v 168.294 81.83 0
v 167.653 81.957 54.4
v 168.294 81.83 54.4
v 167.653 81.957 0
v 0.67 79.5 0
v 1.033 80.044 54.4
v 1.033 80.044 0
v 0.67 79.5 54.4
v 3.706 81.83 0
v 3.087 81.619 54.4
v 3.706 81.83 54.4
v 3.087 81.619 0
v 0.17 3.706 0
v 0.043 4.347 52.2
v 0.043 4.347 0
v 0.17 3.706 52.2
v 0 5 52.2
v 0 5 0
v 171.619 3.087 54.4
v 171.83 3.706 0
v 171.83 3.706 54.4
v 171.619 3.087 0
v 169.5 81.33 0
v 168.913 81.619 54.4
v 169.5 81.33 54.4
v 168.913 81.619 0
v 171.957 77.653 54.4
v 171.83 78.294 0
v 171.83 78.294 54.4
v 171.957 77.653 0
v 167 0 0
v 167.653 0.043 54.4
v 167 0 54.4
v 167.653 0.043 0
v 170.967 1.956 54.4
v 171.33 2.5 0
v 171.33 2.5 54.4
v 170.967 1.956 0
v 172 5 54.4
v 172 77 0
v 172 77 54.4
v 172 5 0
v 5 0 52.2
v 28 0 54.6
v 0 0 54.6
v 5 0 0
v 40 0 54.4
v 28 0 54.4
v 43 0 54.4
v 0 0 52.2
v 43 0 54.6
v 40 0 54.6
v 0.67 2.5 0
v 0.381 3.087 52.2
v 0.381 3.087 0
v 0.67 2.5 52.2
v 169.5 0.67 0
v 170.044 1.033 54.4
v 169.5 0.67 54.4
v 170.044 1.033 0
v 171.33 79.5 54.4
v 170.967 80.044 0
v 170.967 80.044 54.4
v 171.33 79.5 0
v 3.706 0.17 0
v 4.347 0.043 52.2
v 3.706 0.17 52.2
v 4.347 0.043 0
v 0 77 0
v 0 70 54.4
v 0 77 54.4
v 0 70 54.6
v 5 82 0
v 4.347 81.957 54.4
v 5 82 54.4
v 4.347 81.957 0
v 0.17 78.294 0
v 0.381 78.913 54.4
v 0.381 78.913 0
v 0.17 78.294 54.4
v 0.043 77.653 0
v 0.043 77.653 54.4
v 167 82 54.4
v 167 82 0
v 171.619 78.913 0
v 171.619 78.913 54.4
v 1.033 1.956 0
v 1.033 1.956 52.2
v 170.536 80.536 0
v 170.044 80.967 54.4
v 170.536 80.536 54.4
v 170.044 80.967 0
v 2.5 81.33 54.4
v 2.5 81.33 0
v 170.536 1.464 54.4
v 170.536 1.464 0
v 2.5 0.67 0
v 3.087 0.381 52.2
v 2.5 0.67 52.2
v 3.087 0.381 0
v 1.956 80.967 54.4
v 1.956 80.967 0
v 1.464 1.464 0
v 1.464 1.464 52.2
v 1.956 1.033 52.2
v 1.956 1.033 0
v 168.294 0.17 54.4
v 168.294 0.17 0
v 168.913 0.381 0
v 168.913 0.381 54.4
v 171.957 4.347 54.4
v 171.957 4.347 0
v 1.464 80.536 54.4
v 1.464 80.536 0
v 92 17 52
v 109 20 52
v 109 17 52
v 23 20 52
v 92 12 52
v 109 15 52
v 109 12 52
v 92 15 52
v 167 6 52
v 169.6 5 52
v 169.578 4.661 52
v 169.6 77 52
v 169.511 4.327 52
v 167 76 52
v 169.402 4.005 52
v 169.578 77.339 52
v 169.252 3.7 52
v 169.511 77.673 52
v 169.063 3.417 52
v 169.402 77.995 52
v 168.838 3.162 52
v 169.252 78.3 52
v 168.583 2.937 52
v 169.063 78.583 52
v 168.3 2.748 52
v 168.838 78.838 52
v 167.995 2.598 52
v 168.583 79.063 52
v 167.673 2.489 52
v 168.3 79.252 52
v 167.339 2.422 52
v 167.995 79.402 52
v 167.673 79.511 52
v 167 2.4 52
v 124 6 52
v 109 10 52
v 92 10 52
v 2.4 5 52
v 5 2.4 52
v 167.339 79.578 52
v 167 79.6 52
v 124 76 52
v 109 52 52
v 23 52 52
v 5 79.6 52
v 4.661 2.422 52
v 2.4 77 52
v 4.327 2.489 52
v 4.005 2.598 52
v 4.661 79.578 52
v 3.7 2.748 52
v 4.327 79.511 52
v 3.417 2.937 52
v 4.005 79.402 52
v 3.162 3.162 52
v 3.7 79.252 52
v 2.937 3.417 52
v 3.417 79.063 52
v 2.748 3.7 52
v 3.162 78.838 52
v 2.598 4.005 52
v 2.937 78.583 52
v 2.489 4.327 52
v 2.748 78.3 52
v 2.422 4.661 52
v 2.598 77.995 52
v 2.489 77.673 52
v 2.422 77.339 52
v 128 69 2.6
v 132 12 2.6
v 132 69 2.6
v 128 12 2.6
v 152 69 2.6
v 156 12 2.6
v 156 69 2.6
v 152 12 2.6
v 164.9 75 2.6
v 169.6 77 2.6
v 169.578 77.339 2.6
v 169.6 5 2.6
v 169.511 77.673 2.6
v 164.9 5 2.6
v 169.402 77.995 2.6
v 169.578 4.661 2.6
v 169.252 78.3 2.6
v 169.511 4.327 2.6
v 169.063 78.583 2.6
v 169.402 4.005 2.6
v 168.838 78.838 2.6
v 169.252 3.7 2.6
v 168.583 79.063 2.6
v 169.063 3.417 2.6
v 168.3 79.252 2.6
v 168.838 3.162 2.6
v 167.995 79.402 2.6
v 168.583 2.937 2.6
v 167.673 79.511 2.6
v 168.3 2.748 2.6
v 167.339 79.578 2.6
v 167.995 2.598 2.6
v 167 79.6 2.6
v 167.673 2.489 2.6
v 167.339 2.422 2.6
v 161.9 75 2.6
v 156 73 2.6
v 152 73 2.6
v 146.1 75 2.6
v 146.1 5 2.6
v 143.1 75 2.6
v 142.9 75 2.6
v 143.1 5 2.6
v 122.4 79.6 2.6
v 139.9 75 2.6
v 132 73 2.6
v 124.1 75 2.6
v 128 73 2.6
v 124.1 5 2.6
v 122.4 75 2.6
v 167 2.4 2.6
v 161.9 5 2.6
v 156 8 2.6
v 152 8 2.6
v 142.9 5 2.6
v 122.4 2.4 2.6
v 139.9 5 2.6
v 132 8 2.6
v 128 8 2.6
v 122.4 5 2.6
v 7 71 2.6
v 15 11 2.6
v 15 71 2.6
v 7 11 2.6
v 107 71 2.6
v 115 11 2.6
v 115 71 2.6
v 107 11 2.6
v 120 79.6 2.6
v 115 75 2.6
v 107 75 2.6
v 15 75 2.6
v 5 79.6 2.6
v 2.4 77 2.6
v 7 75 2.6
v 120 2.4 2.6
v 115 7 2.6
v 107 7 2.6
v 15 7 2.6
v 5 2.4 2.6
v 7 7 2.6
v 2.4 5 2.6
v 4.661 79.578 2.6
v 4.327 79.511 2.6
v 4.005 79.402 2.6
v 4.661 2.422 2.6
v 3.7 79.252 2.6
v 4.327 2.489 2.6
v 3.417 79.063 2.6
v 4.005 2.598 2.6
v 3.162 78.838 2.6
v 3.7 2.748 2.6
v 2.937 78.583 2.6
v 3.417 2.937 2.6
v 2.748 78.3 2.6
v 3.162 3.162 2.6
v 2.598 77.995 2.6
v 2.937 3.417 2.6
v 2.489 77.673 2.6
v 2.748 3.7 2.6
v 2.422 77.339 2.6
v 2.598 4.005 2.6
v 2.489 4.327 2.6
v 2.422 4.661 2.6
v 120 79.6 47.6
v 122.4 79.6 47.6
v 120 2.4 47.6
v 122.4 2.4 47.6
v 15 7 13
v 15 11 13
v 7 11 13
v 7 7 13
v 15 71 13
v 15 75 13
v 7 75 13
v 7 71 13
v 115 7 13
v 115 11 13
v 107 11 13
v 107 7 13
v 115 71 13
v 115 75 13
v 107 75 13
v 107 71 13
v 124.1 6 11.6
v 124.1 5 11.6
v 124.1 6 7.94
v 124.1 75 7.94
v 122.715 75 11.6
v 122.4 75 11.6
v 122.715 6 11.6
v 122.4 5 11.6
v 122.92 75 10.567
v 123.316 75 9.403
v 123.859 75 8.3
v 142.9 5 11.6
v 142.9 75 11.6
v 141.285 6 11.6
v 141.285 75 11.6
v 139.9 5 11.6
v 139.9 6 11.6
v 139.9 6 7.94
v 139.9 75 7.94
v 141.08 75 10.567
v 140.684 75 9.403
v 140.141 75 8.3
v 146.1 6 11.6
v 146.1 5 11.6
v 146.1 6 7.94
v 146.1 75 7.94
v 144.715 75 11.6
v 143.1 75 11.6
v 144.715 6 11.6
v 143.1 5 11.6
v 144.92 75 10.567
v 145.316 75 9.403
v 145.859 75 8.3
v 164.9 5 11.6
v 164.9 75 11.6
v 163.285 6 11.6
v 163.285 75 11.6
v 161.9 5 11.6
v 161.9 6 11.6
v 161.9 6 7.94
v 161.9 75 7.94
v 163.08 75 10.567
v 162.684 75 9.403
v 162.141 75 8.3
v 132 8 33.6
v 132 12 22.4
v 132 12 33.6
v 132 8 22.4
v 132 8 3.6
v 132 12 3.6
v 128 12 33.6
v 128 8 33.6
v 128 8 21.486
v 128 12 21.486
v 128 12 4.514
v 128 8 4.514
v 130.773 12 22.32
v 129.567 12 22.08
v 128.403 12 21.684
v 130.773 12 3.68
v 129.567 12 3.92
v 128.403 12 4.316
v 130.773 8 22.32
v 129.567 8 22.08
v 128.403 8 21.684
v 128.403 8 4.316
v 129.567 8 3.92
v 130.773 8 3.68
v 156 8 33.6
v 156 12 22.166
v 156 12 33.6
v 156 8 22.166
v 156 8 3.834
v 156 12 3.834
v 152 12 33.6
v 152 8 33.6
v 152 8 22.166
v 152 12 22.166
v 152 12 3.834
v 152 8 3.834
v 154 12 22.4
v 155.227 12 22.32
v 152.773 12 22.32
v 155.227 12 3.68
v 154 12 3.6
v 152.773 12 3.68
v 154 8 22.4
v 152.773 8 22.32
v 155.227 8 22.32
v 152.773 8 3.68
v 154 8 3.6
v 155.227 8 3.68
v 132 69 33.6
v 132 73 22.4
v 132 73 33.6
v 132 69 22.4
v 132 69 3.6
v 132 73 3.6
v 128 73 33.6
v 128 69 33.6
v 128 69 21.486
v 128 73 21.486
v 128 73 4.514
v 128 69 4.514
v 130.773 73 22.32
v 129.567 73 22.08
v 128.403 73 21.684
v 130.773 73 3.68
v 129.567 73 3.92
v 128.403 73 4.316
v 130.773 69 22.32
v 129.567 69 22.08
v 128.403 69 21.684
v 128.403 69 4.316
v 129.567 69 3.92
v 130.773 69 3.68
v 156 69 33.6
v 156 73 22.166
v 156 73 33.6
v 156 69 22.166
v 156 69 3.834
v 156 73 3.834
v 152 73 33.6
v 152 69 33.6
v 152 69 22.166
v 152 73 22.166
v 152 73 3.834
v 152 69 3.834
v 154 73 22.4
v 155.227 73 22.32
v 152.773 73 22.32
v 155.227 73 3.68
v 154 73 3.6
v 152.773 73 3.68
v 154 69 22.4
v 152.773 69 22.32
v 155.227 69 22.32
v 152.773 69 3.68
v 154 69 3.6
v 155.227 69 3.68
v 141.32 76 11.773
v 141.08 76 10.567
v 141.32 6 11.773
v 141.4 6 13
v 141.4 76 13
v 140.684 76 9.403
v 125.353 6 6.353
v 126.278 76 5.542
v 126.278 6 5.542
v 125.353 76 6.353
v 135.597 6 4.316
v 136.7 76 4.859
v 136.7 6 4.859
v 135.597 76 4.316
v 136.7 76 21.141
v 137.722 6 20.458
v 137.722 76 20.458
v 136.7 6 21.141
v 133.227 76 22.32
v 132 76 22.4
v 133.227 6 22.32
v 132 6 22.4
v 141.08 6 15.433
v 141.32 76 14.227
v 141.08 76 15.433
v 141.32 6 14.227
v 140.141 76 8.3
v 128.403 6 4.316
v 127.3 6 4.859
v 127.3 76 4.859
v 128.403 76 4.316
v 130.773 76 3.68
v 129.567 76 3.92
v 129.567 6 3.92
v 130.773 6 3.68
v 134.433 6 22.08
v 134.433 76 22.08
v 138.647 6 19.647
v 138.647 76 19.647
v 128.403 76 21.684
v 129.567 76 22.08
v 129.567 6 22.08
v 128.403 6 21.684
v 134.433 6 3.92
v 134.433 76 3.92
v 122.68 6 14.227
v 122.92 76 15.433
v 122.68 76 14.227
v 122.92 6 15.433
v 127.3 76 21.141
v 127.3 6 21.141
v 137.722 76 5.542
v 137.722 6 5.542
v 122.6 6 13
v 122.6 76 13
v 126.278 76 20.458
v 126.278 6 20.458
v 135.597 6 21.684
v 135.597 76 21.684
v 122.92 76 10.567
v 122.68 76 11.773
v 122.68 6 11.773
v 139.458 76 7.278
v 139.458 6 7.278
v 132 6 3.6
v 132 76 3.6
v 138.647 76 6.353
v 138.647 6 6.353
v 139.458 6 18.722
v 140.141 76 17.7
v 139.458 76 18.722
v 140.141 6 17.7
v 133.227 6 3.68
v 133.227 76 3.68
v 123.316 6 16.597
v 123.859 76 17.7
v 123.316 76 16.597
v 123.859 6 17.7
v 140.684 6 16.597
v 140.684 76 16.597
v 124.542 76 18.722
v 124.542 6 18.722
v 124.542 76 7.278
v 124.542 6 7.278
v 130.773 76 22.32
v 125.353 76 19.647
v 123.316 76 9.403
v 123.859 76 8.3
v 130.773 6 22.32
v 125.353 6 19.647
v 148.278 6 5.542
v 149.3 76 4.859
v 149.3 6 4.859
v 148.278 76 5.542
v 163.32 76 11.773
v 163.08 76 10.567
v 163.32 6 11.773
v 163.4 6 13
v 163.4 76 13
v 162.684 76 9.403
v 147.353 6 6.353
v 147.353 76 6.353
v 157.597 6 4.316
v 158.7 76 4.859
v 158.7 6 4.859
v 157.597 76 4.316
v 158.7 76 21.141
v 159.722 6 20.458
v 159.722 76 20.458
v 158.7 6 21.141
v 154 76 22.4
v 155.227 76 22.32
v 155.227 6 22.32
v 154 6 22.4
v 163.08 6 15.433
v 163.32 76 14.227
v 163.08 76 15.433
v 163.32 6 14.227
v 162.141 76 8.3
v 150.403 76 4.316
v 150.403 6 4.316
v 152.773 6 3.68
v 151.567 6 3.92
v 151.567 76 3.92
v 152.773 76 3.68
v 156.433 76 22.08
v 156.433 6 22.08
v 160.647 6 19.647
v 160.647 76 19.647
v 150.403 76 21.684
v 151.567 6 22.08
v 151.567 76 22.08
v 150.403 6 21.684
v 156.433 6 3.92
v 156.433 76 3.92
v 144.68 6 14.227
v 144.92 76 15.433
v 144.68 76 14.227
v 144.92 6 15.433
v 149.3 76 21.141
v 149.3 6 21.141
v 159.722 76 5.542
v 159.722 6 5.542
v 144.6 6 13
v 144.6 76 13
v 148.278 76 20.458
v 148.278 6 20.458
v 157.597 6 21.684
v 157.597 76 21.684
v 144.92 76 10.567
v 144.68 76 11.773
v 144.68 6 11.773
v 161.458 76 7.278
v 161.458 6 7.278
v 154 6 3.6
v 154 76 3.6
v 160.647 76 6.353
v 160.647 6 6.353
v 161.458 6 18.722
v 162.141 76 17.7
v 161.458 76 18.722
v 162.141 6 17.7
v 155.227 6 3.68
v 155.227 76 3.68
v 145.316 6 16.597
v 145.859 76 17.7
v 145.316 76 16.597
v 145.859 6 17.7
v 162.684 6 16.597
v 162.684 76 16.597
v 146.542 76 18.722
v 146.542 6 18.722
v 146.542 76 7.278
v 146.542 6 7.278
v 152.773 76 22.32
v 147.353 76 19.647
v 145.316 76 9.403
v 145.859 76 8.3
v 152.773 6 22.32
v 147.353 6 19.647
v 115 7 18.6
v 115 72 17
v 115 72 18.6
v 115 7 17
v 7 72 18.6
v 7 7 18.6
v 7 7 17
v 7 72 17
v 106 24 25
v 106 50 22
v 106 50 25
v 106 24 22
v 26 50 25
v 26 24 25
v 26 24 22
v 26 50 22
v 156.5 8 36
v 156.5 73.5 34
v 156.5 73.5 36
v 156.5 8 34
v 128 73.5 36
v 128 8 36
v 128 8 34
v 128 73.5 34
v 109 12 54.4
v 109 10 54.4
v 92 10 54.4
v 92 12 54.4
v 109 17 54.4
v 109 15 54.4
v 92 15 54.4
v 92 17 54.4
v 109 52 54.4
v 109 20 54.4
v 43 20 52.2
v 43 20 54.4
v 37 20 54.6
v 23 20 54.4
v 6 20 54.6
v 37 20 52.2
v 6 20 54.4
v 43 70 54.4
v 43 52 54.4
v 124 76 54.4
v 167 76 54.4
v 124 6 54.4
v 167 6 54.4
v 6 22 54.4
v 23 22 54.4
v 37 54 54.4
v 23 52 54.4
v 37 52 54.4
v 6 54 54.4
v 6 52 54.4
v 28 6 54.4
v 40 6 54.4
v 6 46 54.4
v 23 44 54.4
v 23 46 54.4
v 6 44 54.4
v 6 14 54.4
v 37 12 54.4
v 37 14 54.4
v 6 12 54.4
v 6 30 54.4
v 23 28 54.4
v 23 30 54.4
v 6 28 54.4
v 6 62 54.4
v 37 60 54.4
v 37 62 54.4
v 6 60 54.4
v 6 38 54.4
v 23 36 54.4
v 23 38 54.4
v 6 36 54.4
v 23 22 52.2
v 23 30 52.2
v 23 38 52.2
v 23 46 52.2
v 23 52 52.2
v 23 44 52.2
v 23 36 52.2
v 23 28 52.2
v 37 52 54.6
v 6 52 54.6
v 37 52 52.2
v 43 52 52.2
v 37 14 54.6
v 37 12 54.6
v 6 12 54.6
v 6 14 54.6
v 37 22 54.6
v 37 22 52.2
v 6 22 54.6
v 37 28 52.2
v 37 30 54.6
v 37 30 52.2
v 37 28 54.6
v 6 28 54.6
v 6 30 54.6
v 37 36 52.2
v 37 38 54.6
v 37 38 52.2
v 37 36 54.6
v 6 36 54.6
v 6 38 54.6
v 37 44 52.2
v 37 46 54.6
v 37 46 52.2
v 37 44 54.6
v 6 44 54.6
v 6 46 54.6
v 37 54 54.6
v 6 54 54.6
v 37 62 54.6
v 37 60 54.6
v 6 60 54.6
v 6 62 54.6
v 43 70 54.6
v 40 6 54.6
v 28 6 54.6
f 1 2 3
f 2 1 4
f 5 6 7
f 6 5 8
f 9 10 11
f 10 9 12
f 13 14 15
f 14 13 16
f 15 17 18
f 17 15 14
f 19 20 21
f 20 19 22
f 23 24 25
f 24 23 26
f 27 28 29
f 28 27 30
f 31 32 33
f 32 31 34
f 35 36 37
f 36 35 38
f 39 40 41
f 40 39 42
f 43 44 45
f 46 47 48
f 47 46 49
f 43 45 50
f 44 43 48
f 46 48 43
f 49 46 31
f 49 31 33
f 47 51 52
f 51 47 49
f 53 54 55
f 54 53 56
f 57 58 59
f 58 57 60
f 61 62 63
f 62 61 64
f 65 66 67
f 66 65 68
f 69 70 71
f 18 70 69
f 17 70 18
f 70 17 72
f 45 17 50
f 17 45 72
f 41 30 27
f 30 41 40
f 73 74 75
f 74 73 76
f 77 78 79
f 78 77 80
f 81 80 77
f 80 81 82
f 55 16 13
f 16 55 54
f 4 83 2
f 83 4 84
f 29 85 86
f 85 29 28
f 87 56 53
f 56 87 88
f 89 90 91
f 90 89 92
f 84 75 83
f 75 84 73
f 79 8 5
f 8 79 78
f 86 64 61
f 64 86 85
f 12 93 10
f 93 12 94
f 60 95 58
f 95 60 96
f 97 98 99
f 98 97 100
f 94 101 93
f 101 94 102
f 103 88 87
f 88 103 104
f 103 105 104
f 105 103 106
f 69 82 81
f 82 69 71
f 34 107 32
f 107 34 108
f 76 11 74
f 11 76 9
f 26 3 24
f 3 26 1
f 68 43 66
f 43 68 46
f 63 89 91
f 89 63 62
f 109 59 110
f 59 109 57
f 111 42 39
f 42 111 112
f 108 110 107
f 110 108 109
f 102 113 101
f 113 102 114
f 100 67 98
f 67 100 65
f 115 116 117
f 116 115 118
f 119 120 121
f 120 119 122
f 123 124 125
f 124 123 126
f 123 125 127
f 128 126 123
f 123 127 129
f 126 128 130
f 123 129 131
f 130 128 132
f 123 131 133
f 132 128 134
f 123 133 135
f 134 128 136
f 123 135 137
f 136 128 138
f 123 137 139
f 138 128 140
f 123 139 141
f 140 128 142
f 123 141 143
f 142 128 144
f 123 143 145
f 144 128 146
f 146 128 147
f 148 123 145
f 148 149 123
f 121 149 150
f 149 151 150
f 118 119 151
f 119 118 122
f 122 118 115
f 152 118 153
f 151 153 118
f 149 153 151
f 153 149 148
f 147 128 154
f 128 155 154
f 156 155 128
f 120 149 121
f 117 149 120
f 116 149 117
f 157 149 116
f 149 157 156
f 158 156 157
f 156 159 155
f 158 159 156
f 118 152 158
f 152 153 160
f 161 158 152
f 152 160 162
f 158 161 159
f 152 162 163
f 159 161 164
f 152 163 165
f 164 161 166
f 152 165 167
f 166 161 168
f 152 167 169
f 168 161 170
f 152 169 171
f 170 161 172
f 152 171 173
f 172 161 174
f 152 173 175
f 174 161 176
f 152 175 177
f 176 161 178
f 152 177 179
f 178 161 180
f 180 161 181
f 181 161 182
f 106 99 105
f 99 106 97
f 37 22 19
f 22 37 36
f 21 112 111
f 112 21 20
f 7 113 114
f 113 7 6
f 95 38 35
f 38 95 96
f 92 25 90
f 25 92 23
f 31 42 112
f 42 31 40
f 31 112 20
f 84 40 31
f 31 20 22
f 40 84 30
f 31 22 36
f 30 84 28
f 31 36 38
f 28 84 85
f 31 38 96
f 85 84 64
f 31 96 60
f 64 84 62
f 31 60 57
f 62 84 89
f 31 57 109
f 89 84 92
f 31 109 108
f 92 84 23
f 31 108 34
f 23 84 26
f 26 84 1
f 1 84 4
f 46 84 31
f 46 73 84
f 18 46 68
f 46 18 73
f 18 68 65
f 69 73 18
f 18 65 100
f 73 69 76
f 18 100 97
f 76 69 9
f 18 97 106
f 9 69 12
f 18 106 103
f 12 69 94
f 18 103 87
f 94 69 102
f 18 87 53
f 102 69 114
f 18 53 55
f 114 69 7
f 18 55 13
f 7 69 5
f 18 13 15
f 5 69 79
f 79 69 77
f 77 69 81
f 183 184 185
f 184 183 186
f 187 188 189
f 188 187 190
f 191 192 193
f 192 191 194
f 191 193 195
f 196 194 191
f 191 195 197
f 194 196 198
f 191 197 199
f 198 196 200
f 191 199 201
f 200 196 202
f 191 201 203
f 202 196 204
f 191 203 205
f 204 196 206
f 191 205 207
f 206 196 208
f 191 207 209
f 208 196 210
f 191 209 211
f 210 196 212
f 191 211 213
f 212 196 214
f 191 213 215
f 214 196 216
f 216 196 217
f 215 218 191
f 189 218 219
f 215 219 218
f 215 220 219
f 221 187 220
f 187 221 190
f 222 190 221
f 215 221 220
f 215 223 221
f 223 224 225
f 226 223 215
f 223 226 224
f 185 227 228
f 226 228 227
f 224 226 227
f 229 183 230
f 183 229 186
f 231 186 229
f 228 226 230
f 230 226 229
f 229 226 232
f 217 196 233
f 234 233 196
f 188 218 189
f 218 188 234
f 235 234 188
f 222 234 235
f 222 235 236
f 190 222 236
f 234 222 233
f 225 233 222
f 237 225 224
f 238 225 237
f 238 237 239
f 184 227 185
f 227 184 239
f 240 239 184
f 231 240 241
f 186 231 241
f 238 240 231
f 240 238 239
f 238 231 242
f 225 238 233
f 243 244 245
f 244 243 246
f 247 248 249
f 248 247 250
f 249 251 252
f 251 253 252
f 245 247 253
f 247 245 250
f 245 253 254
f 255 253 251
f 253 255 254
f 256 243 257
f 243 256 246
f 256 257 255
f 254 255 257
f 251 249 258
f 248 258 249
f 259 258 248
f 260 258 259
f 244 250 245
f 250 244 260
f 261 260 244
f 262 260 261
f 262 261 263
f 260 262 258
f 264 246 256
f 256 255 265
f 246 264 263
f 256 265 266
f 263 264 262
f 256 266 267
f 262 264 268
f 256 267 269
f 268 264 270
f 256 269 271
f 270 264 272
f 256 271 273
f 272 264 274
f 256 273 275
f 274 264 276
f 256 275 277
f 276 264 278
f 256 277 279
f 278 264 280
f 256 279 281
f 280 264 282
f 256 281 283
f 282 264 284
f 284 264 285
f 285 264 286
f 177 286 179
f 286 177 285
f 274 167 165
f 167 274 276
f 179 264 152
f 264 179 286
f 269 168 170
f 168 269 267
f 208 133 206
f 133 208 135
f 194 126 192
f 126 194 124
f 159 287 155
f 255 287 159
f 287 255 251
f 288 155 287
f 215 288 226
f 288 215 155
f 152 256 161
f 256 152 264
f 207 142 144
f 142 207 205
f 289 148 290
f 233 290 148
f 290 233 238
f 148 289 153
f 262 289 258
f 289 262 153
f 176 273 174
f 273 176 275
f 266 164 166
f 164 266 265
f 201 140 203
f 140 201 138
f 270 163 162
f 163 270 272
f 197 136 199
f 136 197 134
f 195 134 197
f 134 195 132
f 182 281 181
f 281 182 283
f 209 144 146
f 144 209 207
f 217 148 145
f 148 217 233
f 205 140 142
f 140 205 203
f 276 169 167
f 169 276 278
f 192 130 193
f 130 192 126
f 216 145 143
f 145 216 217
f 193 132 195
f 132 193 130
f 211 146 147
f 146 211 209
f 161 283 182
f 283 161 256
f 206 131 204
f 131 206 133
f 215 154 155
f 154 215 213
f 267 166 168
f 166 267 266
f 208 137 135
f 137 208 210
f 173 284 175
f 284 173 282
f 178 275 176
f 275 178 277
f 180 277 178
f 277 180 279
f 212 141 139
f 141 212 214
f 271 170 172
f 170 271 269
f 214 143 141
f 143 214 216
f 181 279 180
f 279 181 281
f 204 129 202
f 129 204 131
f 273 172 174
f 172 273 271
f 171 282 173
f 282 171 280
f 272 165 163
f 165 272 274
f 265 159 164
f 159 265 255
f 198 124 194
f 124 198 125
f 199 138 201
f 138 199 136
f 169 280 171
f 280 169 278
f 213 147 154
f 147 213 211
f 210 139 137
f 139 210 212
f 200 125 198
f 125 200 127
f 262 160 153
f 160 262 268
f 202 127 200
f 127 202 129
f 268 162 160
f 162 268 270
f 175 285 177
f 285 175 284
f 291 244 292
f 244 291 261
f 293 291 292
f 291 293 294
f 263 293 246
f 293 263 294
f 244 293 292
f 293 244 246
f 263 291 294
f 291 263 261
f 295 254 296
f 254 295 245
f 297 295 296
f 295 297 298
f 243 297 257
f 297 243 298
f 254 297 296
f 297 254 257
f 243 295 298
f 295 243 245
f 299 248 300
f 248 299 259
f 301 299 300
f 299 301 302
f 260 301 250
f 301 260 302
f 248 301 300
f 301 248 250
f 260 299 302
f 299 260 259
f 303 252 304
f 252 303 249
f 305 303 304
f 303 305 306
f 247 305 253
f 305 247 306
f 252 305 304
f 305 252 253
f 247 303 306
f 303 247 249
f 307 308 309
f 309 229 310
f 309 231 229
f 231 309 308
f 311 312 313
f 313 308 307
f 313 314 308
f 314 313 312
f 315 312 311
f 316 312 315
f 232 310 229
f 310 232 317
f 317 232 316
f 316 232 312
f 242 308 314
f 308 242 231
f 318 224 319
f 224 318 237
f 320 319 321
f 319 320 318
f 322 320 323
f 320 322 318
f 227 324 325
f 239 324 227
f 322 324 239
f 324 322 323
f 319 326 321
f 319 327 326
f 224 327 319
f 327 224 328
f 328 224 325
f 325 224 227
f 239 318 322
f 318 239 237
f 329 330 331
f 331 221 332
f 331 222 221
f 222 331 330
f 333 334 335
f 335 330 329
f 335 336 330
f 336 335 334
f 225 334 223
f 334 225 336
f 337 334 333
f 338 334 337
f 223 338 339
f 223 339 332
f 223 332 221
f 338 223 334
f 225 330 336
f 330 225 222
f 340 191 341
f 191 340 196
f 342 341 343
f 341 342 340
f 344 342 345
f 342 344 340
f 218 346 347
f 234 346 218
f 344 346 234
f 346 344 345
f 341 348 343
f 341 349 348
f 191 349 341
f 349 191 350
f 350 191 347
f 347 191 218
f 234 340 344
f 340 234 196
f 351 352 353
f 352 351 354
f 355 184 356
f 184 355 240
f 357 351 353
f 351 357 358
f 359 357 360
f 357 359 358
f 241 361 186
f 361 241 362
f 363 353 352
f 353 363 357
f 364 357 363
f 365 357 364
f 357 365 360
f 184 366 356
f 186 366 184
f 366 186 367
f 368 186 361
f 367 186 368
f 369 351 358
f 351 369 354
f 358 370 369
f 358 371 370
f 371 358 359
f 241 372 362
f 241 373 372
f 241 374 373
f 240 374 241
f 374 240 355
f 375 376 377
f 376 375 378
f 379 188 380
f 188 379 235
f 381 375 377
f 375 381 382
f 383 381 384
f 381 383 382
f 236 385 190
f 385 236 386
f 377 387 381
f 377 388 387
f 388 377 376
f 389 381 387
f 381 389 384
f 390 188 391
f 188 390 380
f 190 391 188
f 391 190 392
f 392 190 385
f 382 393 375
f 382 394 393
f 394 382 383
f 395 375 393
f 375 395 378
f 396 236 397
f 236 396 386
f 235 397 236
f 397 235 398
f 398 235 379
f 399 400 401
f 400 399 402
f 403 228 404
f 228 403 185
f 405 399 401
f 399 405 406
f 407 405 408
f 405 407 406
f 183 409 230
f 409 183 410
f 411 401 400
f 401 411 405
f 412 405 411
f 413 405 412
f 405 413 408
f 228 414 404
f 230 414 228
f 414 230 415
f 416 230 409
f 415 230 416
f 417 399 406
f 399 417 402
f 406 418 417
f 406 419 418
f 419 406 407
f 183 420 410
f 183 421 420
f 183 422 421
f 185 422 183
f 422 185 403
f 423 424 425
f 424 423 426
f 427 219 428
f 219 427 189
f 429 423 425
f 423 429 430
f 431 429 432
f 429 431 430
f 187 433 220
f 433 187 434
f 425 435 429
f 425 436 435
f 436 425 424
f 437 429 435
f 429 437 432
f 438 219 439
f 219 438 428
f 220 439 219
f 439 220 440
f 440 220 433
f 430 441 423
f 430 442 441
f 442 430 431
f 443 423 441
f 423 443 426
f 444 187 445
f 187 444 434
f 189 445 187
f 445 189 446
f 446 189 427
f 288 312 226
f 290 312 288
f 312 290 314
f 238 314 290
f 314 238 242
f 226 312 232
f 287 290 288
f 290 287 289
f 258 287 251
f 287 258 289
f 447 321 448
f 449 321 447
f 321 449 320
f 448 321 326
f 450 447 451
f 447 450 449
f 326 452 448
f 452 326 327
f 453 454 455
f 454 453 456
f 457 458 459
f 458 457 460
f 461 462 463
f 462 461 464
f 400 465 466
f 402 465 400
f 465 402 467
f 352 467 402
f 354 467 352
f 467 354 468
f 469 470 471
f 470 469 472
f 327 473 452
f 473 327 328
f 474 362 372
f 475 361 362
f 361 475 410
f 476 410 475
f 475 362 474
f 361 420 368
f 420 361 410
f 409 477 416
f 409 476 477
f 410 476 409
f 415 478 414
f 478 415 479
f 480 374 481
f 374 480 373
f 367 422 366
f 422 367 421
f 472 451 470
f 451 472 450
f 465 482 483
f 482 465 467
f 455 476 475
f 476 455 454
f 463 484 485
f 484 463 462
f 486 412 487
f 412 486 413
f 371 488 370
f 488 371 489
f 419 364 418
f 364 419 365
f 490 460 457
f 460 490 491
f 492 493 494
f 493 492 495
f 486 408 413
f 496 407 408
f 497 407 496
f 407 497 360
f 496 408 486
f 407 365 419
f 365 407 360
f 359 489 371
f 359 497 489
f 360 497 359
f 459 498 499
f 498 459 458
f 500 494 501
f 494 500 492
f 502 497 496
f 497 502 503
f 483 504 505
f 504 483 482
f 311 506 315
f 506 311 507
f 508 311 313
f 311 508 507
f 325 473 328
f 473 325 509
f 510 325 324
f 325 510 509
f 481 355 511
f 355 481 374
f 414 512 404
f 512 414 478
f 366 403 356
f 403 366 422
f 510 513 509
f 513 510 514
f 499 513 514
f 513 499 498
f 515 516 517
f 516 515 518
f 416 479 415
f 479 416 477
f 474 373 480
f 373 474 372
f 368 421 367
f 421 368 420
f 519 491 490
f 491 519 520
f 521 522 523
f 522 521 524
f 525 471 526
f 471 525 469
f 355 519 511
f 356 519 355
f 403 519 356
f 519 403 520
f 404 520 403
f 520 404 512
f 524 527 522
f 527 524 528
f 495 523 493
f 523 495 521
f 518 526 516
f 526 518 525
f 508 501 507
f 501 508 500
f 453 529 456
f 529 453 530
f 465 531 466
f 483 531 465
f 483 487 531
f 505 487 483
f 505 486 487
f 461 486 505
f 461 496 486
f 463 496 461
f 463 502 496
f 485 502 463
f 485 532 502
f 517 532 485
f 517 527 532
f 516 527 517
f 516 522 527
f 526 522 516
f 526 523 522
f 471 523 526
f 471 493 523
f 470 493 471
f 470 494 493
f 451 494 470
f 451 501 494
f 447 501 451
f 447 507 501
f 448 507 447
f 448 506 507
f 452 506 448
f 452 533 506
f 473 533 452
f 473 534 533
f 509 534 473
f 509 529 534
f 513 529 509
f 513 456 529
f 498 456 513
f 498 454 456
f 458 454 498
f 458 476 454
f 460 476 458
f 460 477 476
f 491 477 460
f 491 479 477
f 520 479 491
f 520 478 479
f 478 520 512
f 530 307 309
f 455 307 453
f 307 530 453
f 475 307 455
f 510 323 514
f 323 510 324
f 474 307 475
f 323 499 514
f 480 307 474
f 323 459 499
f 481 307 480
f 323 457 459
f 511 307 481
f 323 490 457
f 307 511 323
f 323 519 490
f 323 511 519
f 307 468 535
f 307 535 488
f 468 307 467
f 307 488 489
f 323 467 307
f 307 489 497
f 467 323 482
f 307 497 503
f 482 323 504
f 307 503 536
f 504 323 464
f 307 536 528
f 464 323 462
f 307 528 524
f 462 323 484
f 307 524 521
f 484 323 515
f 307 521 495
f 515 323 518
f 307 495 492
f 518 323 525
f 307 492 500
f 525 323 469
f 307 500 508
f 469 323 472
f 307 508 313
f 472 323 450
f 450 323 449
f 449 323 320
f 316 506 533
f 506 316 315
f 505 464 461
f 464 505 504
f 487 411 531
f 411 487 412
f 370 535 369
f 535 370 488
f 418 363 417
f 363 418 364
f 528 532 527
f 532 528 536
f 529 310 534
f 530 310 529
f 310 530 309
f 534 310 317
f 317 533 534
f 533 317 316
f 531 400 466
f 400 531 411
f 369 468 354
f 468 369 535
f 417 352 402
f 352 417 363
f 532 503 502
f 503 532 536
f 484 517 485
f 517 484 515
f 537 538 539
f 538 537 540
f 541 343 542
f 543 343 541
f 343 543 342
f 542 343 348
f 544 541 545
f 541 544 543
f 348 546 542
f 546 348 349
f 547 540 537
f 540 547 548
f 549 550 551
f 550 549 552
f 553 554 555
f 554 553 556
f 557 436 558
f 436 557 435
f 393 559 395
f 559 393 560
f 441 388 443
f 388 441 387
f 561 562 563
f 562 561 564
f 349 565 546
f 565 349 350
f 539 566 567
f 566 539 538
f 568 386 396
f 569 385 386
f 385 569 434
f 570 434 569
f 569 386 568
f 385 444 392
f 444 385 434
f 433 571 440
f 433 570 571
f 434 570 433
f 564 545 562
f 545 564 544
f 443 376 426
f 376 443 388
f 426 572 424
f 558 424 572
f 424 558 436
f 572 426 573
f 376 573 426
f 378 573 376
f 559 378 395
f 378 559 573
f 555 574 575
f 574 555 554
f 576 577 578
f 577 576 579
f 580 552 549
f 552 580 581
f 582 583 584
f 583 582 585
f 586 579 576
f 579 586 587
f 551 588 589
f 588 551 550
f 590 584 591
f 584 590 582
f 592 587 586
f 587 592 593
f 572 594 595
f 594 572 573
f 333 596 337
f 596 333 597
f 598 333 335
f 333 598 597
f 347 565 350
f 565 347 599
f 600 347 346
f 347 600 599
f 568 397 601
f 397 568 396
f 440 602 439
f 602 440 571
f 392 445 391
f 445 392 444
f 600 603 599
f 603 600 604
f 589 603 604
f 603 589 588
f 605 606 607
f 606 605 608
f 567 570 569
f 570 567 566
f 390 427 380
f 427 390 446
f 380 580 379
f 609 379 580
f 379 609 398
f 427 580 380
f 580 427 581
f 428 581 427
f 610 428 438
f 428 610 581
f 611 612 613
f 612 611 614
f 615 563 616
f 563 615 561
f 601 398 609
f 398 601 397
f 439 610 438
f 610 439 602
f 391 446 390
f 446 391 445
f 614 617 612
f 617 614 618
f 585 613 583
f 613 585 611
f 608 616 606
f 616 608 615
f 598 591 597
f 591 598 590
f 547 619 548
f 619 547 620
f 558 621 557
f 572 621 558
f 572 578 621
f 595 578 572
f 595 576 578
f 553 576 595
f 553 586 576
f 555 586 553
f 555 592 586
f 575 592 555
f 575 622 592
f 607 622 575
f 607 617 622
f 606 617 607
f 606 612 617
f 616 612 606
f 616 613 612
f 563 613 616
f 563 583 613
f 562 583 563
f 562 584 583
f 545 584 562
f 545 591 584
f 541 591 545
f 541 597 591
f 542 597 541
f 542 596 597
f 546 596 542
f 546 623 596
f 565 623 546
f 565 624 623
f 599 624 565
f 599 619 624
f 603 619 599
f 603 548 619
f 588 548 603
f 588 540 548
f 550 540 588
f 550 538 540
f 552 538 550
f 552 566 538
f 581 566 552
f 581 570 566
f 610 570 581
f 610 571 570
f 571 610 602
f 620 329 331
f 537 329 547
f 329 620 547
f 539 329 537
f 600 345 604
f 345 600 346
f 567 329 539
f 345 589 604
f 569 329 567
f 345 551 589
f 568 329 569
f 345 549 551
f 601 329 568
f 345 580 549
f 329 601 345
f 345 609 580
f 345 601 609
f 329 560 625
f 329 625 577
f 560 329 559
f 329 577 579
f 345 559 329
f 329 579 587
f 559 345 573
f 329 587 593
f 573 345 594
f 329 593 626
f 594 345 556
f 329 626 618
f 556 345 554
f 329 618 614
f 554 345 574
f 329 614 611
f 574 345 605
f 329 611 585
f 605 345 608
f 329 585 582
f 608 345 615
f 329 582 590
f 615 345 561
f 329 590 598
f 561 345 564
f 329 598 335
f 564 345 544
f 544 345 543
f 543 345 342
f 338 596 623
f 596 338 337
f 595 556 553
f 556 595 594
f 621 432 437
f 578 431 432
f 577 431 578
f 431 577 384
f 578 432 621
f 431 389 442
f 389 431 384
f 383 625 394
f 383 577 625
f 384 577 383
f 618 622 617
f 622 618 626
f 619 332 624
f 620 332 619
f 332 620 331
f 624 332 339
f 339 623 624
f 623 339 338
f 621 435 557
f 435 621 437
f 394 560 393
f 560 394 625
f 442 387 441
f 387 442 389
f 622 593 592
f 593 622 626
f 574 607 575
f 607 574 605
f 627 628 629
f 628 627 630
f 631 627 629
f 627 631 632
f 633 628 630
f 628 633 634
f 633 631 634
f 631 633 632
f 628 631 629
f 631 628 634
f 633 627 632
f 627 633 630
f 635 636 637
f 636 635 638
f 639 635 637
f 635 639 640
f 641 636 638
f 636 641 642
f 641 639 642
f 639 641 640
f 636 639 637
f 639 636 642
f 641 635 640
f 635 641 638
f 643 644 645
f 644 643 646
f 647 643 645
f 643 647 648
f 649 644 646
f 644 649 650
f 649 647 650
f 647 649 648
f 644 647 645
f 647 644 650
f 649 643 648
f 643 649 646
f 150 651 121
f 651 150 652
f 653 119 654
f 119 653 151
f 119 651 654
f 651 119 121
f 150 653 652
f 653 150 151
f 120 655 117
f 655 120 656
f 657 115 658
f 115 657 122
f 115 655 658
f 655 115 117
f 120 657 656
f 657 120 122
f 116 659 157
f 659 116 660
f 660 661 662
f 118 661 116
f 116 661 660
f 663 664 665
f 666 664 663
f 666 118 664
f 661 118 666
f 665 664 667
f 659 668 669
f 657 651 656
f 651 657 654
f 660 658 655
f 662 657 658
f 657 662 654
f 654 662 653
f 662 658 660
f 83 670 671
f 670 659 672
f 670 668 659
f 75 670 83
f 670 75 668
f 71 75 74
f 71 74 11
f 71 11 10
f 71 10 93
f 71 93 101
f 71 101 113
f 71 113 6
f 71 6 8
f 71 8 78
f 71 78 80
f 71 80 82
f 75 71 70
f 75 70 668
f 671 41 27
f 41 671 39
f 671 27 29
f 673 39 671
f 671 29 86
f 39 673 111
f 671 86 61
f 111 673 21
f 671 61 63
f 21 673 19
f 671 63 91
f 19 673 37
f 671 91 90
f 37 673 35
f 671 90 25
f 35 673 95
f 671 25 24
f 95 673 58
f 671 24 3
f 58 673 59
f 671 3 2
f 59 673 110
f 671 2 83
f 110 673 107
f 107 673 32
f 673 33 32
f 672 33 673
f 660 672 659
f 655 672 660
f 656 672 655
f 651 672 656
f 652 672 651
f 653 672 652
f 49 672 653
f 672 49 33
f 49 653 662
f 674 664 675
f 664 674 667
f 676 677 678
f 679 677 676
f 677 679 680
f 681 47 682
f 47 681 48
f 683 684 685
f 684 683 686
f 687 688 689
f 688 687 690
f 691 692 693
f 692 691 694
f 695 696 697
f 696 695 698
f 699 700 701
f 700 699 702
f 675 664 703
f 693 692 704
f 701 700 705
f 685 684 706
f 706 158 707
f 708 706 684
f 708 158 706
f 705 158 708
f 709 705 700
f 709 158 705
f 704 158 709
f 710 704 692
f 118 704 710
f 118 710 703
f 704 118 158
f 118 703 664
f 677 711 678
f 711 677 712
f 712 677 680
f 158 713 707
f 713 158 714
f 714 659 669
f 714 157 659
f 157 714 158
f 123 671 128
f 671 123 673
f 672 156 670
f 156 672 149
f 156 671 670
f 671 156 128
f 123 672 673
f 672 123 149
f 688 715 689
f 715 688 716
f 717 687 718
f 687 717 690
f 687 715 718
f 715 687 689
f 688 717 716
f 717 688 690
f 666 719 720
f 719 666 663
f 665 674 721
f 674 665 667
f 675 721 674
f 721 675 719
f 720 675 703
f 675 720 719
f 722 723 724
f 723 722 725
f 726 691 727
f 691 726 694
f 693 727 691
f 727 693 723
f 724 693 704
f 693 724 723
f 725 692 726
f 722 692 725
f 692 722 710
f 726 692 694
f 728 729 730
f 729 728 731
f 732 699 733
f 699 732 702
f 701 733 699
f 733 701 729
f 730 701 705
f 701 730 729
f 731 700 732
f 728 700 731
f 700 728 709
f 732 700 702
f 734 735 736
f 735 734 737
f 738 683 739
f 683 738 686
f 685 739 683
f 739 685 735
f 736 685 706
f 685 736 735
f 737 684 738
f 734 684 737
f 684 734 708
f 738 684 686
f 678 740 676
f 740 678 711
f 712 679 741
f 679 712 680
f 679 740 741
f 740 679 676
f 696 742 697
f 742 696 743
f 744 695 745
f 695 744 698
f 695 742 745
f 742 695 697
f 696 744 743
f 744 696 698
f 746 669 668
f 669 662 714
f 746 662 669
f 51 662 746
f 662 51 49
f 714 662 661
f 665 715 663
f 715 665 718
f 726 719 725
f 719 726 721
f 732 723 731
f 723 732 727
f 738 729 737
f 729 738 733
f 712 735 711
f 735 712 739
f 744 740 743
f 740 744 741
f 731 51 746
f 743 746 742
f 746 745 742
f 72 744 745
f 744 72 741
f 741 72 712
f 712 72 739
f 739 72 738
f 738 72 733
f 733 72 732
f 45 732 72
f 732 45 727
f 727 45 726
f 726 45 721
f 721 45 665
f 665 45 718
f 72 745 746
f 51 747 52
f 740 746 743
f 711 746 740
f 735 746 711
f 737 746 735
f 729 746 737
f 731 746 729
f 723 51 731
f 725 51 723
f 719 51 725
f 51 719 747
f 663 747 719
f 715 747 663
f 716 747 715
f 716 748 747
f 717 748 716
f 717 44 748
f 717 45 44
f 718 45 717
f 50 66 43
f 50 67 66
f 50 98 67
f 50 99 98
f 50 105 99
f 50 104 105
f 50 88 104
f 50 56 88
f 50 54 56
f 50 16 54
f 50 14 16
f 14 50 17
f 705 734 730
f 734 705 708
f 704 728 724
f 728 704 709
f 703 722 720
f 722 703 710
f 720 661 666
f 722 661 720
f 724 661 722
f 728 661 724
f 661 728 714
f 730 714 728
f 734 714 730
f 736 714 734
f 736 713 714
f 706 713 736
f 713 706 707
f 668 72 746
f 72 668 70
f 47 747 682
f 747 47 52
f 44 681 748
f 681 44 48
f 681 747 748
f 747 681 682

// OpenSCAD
/* IceGeiger V2 enclosure — PRELIMINARY, no external libraries.
   Verify all dimensions after delivery before final print. */
$fn=48; part="assembly"; // base|lid|service_cover|fit_jig|assembly|exploded|layout
// Measurements to verify
gc_l=108; gc_w=65; gc_t=1.6; gc_clear_below=13; lcd_x=19; lcd_y=17; lcd_l=80; lcd_w=26;
heltec_l=65.5; heltec_w=28.5; cell_d=18.8; cell_l=70;
wall=2.4; floor_t=2.6; lid_t=2.4; case_l=172; case_w=82; base_h=52; corner_r=5; service_x=120;
module r2(l,w,r){hull(){for(x=[r,l-r])for(y=[r,w-r])translate([x,y])circle(r=r);}}
module rb(l,w,h,r){linear_extrude(h)r2(l,w,r);}
module shell(){difference(){rb(case_l,case_w,base_h,corner_r);translate([wall,wall,floor_t])rb(case_l-2*wall,case_w-2*wall,base_h+2,max(1,corner_r-wall));}}
module gc_supports(){for(x=[7,107])for(y=[7,71])translate([x,y,floor_t])cube([8,4,gc_clear_below-floor_t]);}
module batteries(){for(cx=[132,154]){translate([cx-cell_d/2-1.5,5,floor_t])cube([3,cell_l,9]);translate([cx+cell_d/2-1.5,5,floor_t])cube([3,cell_l,9]);}}
module controller_posts(){for(p=[[128,8],[152,8],[128,69],[152,69]])translate([p[0],p[1],floor_t])cube([4,4,31]);}
module base(){union(){shell();gc_supports();batteries();controller_posts();translate([service_x,wall,floor_t])cube([2.4,case_w-2*wall,base_h-7]);}}
module lid(){difference(){rb(case_l,case_w,lid_t,corner_r);translate([23,20,-1])cube([lcd_l+6,lcd_w+6,lid_t+2]);translate([service_x+4,6,-1])cube([43,70,lid_t+2]);for(yy=[10:5:30])translate([92,yy,-1])cube([17,2,lid_t+2]);}}
module service_cover(){difference(){cube([43,70,lid_t]);translate([28,-1,-1])cube([12,7,5]);for(y=[12:8:60])translate([6,y,-1])cube([31,2,5]);}}
module fit_jig(){difference(){cube([30,gc_w+8,10]);translate([3,4,3])cube([30,gc_w,3]);}}
module mock(){color("blue")translate([7,7,17])cube([gc_l,gc_w,gc_t]);color("green")translate([26,24,22])cube([80,26,3]);for(cx=[132,154])color("seagreen")translate([cx,6,13])rotate([-90,0,0])cylinder(d=cell_d,h=cell_l);color("navy")translate([128,8,34])cube([heltec_w,heltec_l,2]);}
module assembly(z=0){color([.75,.75,.78,.55])base();mock();color([.8,.8,.83,.55])translate([0,0,base_h+z])lid();color([.85,.85,.87,.7])translate([0,0,base_h+z+0.2])service_cover();}
if(part=="base")base(); else if(part=="lid")lid(); else if(part=="service_cover")service_cover(); else if(part=="fit_jig")fit_jig(); else if(part=="exploded")assembly(30); else if(part=="layout"){base();mock();} else assembly();
